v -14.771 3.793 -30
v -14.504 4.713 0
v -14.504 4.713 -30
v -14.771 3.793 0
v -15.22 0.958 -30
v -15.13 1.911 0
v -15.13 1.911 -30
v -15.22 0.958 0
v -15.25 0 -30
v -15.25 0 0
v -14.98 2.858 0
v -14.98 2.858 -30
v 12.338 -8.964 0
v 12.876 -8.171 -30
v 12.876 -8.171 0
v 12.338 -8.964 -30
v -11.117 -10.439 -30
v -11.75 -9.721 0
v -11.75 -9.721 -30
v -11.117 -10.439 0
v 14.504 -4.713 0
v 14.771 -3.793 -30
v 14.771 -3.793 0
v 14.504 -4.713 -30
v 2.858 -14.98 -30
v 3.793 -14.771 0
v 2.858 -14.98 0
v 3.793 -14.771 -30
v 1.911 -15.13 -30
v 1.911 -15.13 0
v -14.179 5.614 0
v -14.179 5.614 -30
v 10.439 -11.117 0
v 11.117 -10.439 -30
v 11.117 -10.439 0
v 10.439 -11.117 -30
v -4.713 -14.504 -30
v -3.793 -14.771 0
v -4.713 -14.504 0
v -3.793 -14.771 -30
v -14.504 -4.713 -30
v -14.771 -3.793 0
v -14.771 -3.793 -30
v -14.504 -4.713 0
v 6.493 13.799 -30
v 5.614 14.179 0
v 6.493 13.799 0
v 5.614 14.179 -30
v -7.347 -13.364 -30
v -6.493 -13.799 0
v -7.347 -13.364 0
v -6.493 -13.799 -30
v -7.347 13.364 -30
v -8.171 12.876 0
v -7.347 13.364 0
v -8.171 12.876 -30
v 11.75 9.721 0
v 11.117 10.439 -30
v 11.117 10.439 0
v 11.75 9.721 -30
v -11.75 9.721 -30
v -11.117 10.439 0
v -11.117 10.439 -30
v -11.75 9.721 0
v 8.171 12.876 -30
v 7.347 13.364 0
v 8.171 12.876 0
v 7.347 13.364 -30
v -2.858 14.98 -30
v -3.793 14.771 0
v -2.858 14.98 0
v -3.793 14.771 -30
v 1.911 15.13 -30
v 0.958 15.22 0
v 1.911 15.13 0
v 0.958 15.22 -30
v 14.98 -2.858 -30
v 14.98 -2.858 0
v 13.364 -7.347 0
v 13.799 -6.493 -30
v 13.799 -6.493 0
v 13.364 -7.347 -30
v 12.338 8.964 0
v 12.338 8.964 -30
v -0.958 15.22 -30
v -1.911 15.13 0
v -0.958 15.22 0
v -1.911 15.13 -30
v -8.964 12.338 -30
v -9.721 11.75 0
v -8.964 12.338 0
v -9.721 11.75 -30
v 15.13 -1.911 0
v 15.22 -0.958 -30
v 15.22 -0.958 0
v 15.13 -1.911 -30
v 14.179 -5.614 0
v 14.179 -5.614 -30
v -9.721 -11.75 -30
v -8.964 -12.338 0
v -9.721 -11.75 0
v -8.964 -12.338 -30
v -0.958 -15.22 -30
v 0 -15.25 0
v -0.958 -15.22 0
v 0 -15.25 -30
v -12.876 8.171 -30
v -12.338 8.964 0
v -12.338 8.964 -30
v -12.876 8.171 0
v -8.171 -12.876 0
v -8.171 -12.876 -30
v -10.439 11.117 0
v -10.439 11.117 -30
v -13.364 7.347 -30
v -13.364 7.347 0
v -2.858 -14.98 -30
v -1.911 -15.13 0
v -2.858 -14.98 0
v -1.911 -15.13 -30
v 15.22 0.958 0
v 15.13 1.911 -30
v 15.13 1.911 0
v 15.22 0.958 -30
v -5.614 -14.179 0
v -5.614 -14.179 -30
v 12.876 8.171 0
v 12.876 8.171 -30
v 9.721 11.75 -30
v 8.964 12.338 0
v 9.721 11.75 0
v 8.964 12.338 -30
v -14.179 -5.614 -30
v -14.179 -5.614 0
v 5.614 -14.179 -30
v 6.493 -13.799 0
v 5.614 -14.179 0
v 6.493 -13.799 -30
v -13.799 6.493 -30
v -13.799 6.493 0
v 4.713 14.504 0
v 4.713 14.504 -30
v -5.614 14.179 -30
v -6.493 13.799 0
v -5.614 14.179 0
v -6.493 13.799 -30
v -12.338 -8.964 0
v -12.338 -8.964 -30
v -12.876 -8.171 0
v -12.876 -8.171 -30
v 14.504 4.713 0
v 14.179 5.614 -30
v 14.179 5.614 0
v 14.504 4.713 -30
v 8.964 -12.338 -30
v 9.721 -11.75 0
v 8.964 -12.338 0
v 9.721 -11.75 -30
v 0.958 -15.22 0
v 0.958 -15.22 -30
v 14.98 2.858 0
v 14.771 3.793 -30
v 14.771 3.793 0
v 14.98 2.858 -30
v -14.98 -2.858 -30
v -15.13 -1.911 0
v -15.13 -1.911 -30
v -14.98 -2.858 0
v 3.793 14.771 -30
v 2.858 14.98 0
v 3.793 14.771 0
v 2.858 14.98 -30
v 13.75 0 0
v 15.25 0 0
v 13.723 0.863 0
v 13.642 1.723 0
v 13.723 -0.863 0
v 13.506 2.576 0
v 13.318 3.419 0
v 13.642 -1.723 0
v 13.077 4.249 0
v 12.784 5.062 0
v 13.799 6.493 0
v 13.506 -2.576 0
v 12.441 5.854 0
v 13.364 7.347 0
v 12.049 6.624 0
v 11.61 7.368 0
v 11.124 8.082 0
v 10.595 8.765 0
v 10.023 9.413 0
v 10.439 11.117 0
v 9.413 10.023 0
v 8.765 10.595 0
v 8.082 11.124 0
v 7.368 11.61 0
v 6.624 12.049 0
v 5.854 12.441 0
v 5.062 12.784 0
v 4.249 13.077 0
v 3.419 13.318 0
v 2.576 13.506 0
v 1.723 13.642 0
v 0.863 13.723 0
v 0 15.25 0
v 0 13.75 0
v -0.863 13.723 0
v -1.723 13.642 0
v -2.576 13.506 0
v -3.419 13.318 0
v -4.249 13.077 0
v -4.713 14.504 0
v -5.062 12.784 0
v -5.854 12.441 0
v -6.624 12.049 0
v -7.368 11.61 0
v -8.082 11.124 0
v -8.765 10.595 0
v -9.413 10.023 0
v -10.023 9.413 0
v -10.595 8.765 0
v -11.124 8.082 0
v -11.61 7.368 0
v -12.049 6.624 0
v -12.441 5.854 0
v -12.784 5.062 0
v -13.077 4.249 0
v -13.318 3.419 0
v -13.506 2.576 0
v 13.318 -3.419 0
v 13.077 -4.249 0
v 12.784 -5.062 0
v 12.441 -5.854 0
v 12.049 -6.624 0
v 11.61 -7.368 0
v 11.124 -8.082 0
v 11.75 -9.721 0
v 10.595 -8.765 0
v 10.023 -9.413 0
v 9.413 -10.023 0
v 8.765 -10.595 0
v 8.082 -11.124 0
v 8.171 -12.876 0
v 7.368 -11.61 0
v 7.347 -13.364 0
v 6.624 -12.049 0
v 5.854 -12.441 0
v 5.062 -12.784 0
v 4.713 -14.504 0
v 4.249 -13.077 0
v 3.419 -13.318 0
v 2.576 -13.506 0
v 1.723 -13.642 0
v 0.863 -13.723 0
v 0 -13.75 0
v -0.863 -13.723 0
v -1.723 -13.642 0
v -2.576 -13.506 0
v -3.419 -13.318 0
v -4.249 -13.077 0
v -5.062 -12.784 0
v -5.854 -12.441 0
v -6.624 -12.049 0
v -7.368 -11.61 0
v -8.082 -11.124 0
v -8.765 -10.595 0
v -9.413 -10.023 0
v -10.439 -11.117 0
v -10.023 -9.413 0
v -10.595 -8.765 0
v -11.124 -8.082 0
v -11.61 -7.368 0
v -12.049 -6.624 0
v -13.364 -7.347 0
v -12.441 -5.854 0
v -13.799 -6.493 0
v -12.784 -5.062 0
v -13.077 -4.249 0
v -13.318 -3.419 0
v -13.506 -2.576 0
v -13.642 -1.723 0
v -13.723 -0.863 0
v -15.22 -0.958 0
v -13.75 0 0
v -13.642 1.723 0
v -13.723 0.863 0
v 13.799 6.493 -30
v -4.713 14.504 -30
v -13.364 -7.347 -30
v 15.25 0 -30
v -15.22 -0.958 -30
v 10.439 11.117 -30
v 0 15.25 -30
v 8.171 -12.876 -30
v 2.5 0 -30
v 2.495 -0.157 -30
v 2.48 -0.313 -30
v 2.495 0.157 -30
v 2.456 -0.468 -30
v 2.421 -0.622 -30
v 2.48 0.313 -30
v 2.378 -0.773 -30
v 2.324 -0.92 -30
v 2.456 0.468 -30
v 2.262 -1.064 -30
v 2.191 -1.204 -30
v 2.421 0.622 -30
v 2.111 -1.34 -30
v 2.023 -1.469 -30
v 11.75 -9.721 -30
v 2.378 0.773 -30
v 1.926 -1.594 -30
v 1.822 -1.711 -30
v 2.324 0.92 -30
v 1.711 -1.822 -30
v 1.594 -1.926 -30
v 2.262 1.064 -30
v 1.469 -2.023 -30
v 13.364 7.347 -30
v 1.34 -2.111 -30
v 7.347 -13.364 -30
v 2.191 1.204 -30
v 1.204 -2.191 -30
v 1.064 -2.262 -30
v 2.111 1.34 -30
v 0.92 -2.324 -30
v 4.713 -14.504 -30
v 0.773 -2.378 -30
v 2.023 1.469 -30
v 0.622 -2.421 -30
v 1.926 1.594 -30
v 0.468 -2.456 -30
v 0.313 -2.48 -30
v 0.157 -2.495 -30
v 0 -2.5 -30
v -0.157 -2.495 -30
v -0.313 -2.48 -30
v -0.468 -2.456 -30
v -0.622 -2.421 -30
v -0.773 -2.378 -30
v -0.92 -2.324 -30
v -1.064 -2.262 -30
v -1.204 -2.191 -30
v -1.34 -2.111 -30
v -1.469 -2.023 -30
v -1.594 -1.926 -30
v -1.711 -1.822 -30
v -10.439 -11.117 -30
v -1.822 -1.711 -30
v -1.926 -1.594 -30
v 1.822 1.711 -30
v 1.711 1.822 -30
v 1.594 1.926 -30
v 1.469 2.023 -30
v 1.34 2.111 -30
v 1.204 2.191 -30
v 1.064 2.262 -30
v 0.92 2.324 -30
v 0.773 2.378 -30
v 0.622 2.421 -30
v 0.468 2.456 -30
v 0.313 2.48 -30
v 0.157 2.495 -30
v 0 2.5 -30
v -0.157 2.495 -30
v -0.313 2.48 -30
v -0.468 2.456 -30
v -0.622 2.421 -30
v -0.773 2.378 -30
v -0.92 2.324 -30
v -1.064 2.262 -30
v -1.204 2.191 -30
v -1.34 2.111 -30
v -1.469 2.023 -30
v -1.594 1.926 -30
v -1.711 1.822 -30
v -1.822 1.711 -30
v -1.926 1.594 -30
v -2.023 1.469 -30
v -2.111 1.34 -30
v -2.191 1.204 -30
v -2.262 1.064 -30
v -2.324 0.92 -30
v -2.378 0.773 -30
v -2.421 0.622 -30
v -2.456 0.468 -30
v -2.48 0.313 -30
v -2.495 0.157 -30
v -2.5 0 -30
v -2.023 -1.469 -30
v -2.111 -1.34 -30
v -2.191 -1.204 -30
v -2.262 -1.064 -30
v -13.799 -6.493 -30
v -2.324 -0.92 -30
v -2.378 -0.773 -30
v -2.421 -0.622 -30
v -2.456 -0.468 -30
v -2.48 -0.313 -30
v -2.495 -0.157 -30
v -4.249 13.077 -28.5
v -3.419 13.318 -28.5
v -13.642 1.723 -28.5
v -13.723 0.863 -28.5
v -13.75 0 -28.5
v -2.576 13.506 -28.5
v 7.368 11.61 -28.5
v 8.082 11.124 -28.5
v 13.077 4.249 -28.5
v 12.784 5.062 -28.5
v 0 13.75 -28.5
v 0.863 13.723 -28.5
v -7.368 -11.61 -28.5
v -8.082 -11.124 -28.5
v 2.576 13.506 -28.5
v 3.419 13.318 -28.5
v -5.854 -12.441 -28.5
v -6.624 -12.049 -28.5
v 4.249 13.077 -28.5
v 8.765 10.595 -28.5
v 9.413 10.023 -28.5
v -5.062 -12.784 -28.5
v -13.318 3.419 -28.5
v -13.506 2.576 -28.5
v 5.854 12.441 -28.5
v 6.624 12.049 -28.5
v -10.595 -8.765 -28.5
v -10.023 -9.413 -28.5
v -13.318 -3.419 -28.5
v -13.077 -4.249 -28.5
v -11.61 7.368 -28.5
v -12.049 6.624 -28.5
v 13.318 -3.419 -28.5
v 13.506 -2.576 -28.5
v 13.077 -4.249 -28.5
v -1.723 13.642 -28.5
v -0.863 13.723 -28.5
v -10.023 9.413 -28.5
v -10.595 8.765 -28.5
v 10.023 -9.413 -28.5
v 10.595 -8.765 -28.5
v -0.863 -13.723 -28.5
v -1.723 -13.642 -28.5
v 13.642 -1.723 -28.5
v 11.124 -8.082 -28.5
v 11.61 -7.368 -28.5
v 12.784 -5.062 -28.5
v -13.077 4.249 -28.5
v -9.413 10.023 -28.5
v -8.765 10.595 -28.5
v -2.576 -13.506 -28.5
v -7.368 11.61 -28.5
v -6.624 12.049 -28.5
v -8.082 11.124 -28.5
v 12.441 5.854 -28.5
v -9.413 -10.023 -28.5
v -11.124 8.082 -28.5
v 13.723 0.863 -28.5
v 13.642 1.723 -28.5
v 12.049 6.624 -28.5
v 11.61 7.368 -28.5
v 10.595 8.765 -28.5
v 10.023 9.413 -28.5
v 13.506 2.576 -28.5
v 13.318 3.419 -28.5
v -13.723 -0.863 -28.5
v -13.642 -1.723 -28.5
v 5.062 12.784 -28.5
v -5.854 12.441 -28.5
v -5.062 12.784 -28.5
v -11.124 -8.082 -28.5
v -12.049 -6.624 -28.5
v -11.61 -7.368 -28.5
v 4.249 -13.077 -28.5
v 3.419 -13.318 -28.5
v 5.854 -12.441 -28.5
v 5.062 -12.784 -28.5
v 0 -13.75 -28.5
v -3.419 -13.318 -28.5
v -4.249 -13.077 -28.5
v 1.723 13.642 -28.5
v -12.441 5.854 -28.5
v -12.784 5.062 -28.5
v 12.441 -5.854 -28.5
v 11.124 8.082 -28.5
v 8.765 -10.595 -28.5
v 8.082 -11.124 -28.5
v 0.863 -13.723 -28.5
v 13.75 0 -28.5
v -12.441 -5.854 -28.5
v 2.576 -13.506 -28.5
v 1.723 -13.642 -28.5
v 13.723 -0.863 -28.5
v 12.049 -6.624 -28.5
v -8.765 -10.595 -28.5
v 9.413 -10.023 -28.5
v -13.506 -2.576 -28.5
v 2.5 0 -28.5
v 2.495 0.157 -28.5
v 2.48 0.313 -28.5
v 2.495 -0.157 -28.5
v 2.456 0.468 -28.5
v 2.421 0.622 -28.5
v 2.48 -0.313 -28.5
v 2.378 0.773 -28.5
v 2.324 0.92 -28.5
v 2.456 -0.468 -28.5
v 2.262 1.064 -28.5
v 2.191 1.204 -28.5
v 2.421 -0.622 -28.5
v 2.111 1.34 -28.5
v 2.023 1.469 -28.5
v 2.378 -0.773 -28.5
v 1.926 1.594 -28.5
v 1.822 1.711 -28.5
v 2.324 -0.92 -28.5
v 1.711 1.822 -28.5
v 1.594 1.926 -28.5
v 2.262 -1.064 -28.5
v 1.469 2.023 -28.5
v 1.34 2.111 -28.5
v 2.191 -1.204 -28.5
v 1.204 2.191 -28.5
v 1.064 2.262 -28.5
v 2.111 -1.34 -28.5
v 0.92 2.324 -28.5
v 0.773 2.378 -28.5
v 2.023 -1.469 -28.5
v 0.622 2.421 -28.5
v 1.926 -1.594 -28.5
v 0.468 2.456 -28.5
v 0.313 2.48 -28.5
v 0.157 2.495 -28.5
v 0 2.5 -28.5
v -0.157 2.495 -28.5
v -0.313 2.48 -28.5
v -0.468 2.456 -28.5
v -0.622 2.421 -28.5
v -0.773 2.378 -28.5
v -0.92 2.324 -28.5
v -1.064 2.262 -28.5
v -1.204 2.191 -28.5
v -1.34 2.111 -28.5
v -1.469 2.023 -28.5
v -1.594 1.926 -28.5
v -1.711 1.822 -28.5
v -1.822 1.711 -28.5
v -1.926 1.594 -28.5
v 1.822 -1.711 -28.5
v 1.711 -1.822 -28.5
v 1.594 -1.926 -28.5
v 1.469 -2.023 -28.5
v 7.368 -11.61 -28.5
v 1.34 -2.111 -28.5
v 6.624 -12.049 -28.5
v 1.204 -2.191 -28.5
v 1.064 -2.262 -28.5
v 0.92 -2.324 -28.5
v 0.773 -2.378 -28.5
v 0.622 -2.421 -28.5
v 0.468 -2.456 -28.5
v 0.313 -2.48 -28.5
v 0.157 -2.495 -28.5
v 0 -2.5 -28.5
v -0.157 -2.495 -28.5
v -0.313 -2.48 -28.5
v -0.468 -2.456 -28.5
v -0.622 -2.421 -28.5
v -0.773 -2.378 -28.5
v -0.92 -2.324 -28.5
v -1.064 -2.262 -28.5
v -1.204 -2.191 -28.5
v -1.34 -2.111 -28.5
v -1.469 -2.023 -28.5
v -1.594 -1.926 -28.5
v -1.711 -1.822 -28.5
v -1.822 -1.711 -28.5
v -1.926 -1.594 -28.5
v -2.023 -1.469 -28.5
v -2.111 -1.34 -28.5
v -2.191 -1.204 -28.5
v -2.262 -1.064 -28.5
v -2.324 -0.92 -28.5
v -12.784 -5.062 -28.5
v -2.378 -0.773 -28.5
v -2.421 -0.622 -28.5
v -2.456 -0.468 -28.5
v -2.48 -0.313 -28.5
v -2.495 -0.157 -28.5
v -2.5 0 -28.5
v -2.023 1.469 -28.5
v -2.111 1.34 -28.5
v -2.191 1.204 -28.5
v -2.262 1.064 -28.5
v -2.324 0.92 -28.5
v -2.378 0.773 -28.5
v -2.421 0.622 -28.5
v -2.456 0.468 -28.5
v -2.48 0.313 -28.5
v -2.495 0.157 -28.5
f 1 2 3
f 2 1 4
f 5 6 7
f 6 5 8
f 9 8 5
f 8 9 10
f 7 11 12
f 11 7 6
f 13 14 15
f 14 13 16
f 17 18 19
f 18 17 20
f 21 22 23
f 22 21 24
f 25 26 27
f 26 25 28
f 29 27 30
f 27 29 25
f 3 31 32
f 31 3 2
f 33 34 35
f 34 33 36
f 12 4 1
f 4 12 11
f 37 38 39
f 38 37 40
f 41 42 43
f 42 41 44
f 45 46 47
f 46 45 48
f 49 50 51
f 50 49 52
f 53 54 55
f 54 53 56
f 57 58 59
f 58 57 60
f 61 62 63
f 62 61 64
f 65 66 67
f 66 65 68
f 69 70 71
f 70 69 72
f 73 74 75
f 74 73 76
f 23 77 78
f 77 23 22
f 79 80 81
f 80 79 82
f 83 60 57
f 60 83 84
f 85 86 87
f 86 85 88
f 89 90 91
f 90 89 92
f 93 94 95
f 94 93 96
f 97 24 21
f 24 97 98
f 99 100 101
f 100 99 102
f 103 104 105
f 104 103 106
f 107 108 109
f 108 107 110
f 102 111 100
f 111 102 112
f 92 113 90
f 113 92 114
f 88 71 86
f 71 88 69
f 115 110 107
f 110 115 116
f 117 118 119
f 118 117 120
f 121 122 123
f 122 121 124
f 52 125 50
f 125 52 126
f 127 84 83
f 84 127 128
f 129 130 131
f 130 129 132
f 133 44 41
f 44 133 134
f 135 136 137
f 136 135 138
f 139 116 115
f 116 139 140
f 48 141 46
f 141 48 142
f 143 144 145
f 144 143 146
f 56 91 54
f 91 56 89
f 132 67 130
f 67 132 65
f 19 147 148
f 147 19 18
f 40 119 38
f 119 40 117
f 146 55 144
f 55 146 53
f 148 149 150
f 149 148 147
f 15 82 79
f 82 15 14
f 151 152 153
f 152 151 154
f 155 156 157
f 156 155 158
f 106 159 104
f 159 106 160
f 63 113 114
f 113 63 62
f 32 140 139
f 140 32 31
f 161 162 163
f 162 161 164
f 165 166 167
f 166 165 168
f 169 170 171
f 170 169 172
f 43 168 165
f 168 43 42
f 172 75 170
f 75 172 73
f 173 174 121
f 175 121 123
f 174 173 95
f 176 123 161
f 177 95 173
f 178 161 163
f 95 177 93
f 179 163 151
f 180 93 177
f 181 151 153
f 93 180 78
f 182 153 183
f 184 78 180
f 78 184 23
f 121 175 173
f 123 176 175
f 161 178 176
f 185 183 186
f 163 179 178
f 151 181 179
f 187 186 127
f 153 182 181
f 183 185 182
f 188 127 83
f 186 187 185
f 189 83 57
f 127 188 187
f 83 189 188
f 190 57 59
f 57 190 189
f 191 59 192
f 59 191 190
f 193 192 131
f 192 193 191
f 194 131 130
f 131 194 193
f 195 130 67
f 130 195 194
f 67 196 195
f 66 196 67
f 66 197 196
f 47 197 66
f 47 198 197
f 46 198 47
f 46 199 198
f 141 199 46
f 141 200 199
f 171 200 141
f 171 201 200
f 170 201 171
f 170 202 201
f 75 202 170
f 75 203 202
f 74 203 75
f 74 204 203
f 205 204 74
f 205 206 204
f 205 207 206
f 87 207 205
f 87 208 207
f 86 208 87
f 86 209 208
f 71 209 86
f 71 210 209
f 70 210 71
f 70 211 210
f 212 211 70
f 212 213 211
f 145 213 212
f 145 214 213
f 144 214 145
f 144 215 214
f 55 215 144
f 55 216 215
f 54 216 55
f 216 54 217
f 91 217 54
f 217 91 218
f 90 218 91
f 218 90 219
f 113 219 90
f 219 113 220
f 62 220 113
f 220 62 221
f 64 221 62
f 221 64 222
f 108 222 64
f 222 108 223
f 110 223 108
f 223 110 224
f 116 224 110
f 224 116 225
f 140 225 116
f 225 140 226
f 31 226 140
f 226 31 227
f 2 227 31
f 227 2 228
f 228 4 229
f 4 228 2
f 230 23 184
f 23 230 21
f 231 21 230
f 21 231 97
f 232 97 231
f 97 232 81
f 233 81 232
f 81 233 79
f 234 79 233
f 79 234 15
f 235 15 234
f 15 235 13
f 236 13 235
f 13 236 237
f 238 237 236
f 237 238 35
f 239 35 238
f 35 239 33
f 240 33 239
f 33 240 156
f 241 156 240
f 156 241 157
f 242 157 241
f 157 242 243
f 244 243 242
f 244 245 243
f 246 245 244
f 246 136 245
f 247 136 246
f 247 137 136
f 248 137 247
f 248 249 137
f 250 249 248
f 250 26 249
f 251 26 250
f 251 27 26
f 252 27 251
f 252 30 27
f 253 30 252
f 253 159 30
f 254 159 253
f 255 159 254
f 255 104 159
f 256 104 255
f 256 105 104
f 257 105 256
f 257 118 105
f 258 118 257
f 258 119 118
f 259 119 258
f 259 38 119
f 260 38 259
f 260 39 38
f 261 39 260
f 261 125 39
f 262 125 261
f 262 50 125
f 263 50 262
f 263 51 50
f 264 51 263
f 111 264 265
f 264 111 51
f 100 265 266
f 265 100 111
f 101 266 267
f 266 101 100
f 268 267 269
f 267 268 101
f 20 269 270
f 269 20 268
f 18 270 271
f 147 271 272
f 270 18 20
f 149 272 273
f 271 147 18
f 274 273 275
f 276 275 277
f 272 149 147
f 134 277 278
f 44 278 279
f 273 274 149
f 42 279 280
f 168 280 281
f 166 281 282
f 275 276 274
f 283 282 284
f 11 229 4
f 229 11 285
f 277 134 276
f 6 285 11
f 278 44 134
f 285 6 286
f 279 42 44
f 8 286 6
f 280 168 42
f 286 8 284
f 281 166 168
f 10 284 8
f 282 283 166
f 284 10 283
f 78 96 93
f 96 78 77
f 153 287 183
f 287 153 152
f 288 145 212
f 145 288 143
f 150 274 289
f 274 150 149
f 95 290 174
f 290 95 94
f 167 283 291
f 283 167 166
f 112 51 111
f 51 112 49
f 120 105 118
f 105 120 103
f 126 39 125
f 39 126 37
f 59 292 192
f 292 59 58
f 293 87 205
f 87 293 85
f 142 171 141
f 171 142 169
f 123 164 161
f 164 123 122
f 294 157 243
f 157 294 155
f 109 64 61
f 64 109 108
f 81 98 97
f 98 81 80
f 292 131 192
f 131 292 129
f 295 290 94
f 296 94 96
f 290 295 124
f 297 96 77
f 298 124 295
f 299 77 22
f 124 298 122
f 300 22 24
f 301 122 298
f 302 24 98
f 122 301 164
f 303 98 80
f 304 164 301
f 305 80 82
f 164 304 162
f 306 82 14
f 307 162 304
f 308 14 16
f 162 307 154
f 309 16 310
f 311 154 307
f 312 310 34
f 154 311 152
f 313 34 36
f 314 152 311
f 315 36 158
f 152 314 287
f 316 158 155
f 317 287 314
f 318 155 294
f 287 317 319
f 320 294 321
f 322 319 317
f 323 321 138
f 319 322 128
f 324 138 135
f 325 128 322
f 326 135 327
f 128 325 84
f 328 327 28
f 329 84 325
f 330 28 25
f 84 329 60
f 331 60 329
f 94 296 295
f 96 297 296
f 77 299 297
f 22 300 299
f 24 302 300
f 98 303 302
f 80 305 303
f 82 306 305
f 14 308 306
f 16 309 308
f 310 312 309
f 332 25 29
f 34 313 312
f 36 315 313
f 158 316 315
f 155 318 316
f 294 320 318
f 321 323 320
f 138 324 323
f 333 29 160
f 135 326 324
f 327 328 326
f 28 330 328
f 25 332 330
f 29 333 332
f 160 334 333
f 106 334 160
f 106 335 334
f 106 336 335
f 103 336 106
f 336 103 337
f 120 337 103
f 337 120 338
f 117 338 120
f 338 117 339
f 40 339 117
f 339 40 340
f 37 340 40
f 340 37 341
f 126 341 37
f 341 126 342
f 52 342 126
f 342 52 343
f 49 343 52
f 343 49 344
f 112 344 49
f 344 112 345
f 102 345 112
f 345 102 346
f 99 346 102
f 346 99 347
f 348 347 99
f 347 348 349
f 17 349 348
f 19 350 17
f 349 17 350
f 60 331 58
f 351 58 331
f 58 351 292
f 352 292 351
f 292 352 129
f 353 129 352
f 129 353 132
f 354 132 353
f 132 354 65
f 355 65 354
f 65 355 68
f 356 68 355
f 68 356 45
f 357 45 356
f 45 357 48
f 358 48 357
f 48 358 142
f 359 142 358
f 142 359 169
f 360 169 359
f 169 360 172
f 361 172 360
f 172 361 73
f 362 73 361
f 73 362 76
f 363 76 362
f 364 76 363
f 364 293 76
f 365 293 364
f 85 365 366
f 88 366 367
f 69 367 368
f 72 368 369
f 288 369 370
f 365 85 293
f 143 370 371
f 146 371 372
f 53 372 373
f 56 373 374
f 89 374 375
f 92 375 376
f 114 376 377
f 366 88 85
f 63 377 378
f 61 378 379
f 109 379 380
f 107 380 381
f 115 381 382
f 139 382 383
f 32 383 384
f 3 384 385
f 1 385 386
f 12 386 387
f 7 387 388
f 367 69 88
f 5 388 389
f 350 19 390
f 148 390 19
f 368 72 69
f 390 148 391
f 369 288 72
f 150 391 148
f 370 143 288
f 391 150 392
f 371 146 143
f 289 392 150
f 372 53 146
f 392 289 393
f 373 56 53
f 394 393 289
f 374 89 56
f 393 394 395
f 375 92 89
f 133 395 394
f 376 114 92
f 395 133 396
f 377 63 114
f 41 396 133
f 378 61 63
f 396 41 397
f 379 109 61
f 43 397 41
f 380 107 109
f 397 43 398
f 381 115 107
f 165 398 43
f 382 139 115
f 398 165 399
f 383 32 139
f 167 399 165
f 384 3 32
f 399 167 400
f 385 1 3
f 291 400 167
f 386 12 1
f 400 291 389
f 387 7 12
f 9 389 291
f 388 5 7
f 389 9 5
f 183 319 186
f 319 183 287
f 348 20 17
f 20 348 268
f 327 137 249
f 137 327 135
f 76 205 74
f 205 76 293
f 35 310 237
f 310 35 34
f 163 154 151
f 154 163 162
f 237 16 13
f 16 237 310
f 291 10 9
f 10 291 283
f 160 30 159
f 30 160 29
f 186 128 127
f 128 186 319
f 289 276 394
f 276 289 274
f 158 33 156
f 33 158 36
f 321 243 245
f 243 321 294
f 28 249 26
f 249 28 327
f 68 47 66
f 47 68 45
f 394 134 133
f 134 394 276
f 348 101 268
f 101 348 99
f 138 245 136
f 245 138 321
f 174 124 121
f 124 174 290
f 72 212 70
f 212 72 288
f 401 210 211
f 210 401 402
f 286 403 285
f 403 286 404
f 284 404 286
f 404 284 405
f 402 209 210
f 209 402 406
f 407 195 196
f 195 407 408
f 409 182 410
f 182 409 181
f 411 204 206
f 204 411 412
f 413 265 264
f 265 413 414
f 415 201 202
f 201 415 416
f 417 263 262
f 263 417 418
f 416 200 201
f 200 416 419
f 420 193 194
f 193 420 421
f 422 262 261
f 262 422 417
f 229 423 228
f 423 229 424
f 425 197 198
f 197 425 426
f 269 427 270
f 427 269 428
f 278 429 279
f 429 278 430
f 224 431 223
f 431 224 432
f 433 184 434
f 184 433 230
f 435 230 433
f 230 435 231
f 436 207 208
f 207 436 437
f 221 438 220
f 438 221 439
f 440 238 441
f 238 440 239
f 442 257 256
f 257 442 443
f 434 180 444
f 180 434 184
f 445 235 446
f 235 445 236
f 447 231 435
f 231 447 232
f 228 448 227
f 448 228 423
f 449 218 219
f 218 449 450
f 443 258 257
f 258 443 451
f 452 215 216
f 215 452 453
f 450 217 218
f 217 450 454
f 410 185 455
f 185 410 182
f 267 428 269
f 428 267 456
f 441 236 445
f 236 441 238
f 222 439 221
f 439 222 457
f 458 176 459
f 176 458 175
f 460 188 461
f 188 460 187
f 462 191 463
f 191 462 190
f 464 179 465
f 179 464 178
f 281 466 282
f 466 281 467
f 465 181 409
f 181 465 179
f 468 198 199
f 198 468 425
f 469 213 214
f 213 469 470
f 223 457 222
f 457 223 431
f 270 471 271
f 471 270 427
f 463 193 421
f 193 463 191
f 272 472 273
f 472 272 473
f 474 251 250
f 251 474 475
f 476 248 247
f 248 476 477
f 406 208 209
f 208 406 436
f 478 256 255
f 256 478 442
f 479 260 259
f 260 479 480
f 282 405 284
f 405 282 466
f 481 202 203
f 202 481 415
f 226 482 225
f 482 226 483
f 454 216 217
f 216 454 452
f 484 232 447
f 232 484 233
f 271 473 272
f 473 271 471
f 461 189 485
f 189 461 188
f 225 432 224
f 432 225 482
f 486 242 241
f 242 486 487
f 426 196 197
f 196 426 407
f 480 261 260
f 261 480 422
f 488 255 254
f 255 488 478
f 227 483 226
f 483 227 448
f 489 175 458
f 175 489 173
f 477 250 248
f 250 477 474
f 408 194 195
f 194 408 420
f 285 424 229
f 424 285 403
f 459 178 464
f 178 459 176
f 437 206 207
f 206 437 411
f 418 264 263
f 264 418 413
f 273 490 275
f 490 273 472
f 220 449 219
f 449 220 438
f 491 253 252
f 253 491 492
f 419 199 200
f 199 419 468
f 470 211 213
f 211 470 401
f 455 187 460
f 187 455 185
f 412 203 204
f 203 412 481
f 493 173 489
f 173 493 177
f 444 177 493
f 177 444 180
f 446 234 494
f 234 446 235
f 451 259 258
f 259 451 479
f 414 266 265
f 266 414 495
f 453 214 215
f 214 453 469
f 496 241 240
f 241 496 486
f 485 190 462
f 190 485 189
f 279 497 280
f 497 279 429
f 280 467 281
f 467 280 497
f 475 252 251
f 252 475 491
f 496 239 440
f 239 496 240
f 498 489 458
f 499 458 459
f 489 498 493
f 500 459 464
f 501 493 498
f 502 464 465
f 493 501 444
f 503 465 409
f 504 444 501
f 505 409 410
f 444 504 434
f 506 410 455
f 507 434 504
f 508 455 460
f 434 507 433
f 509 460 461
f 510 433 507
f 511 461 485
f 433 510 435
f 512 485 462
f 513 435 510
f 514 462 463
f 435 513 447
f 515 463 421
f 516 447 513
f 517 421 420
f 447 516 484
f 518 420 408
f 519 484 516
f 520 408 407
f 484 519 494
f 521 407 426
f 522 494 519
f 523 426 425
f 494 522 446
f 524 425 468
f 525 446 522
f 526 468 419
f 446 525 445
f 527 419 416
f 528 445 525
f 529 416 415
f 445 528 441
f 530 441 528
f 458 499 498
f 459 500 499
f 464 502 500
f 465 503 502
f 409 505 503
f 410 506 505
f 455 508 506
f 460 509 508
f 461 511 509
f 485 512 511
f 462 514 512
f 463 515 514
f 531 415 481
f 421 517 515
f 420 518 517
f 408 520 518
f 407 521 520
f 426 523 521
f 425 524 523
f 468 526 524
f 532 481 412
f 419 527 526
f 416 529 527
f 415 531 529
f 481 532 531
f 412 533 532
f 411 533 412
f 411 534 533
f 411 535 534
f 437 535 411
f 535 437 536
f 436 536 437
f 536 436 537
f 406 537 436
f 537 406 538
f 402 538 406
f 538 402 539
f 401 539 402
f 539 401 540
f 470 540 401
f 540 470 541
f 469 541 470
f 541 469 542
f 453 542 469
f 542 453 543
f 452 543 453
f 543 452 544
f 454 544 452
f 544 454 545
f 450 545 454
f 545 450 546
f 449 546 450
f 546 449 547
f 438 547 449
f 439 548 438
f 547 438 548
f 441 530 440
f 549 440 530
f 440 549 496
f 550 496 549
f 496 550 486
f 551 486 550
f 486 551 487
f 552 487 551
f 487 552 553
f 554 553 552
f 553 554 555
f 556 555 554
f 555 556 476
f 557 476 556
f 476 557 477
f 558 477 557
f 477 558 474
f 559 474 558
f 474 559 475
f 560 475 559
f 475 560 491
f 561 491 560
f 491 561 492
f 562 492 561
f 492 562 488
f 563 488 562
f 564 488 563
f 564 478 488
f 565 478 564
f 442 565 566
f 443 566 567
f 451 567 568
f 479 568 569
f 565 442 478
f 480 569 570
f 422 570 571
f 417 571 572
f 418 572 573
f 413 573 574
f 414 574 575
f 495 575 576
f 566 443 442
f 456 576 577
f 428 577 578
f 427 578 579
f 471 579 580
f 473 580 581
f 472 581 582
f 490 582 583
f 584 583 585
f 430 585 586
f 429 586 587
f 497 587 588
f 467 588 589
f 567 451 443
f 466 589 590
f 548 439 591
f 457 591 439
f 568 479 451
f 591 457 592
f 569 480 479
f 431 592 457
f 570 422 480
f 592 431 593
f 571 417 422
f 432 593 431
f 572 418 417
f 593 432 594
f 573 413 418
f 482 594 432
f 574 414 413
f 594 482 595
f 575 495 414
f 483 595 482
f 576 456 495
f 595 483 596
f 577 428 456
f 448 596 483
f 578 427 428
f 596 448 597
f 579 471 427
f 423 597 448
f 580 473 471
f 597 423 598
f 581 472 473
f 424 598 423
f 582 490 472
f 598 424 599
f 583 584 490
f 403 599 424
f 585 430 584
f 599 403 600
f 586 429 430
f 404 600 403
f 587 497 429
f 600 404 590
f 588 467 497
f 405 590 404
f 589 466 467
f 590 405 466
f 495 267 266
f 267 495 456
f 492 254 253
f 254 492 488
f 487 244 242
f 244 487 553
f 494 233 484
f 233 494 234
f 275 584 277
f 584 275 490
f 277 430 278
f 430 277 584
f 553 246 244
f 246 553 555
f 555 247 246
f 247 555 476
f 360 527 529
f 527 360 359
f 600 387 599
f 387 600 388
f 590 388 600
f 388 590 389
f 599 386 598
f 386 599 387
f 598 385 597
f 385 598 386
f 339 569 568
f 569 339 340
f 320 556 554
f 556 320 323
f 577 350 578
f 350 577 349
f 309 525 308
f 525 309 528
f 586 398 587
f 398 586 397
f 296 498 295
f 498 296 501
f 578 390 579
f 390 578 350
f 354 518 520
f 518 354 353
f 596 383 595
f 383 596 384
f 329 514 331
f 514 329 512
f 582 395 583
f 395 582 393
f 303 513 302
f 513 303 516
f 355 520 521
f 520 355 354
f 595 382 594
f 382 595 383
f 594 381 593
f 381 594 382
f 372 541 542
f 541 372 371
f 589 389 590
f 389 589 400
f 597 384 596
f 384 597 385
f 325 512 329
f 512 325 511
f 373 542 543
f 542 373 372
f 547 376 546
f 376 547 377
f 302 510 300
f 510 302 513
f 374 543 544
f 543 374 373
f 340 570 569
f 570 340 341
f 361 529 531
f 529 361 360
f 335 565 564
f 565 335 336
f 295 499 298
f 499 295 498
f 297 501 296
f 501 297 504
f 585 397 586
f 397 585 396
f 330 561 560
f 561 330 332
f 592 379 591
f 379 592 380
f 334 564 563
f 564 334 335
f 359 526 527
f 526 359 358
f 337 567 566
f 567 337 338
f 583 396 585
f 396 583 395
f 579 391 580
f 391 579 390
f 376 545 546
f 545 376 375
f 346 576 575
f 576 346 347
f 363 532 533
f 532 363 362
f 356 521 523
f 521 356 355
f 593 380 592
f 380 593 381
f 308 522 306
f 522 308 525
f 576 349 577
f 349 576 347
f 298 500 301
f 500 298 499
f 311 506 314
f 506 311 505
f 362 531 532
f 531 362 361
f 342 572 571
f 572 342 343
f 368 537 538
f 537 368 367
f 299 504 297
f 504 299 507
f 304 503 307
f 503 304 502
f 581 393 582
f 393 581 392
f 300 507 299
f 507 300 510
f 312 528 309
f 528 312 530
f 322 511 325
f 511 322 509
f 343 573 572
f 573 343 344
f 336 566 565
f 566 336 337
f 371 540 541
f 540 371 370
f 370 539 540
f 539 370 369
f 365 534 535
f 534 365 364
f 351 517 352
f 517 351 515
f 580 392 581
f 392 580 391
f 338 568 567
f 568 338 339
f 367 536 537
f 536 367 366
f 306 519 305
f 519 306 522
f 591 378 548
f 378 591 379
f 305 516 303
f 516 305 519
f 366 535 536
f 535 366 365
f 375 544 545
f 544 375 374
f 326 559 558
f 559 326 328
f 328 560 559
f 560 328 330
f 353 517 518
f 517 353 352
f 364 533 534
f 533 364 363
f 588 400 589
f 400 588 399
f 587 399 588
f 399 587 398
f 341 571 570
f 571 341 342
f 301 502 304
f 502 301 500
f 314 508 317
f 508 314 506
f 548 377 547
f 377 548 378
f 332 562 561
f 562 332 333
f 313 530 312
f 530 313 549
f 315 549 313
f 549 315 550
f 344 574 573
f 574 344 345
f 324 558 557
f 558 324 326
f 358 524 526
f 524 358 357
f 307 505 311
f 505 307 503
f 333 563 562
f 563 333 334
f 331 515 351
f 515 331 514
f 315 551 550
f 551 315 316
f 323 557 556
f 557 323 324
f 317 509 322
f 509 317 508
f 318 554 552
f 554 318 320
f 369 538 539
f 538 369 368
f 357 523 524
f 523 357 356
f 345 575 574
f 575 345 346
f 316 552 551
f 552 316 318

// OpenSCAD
$fn=100;

altura=30;

diametro_interior=27.5; //Antes 27.3
espesor=1.5;
diametro_agujero_cable=5;


rotate([0,180,0])
difference(){
	cylinder(r=diametro_interior/2+espesor, h=altura);

	cylinder(r=diametro_interior/2, h=altura-espesor);
	cylinder(r=diametro_agujero_cable/2, h=altura+espesor);
}
